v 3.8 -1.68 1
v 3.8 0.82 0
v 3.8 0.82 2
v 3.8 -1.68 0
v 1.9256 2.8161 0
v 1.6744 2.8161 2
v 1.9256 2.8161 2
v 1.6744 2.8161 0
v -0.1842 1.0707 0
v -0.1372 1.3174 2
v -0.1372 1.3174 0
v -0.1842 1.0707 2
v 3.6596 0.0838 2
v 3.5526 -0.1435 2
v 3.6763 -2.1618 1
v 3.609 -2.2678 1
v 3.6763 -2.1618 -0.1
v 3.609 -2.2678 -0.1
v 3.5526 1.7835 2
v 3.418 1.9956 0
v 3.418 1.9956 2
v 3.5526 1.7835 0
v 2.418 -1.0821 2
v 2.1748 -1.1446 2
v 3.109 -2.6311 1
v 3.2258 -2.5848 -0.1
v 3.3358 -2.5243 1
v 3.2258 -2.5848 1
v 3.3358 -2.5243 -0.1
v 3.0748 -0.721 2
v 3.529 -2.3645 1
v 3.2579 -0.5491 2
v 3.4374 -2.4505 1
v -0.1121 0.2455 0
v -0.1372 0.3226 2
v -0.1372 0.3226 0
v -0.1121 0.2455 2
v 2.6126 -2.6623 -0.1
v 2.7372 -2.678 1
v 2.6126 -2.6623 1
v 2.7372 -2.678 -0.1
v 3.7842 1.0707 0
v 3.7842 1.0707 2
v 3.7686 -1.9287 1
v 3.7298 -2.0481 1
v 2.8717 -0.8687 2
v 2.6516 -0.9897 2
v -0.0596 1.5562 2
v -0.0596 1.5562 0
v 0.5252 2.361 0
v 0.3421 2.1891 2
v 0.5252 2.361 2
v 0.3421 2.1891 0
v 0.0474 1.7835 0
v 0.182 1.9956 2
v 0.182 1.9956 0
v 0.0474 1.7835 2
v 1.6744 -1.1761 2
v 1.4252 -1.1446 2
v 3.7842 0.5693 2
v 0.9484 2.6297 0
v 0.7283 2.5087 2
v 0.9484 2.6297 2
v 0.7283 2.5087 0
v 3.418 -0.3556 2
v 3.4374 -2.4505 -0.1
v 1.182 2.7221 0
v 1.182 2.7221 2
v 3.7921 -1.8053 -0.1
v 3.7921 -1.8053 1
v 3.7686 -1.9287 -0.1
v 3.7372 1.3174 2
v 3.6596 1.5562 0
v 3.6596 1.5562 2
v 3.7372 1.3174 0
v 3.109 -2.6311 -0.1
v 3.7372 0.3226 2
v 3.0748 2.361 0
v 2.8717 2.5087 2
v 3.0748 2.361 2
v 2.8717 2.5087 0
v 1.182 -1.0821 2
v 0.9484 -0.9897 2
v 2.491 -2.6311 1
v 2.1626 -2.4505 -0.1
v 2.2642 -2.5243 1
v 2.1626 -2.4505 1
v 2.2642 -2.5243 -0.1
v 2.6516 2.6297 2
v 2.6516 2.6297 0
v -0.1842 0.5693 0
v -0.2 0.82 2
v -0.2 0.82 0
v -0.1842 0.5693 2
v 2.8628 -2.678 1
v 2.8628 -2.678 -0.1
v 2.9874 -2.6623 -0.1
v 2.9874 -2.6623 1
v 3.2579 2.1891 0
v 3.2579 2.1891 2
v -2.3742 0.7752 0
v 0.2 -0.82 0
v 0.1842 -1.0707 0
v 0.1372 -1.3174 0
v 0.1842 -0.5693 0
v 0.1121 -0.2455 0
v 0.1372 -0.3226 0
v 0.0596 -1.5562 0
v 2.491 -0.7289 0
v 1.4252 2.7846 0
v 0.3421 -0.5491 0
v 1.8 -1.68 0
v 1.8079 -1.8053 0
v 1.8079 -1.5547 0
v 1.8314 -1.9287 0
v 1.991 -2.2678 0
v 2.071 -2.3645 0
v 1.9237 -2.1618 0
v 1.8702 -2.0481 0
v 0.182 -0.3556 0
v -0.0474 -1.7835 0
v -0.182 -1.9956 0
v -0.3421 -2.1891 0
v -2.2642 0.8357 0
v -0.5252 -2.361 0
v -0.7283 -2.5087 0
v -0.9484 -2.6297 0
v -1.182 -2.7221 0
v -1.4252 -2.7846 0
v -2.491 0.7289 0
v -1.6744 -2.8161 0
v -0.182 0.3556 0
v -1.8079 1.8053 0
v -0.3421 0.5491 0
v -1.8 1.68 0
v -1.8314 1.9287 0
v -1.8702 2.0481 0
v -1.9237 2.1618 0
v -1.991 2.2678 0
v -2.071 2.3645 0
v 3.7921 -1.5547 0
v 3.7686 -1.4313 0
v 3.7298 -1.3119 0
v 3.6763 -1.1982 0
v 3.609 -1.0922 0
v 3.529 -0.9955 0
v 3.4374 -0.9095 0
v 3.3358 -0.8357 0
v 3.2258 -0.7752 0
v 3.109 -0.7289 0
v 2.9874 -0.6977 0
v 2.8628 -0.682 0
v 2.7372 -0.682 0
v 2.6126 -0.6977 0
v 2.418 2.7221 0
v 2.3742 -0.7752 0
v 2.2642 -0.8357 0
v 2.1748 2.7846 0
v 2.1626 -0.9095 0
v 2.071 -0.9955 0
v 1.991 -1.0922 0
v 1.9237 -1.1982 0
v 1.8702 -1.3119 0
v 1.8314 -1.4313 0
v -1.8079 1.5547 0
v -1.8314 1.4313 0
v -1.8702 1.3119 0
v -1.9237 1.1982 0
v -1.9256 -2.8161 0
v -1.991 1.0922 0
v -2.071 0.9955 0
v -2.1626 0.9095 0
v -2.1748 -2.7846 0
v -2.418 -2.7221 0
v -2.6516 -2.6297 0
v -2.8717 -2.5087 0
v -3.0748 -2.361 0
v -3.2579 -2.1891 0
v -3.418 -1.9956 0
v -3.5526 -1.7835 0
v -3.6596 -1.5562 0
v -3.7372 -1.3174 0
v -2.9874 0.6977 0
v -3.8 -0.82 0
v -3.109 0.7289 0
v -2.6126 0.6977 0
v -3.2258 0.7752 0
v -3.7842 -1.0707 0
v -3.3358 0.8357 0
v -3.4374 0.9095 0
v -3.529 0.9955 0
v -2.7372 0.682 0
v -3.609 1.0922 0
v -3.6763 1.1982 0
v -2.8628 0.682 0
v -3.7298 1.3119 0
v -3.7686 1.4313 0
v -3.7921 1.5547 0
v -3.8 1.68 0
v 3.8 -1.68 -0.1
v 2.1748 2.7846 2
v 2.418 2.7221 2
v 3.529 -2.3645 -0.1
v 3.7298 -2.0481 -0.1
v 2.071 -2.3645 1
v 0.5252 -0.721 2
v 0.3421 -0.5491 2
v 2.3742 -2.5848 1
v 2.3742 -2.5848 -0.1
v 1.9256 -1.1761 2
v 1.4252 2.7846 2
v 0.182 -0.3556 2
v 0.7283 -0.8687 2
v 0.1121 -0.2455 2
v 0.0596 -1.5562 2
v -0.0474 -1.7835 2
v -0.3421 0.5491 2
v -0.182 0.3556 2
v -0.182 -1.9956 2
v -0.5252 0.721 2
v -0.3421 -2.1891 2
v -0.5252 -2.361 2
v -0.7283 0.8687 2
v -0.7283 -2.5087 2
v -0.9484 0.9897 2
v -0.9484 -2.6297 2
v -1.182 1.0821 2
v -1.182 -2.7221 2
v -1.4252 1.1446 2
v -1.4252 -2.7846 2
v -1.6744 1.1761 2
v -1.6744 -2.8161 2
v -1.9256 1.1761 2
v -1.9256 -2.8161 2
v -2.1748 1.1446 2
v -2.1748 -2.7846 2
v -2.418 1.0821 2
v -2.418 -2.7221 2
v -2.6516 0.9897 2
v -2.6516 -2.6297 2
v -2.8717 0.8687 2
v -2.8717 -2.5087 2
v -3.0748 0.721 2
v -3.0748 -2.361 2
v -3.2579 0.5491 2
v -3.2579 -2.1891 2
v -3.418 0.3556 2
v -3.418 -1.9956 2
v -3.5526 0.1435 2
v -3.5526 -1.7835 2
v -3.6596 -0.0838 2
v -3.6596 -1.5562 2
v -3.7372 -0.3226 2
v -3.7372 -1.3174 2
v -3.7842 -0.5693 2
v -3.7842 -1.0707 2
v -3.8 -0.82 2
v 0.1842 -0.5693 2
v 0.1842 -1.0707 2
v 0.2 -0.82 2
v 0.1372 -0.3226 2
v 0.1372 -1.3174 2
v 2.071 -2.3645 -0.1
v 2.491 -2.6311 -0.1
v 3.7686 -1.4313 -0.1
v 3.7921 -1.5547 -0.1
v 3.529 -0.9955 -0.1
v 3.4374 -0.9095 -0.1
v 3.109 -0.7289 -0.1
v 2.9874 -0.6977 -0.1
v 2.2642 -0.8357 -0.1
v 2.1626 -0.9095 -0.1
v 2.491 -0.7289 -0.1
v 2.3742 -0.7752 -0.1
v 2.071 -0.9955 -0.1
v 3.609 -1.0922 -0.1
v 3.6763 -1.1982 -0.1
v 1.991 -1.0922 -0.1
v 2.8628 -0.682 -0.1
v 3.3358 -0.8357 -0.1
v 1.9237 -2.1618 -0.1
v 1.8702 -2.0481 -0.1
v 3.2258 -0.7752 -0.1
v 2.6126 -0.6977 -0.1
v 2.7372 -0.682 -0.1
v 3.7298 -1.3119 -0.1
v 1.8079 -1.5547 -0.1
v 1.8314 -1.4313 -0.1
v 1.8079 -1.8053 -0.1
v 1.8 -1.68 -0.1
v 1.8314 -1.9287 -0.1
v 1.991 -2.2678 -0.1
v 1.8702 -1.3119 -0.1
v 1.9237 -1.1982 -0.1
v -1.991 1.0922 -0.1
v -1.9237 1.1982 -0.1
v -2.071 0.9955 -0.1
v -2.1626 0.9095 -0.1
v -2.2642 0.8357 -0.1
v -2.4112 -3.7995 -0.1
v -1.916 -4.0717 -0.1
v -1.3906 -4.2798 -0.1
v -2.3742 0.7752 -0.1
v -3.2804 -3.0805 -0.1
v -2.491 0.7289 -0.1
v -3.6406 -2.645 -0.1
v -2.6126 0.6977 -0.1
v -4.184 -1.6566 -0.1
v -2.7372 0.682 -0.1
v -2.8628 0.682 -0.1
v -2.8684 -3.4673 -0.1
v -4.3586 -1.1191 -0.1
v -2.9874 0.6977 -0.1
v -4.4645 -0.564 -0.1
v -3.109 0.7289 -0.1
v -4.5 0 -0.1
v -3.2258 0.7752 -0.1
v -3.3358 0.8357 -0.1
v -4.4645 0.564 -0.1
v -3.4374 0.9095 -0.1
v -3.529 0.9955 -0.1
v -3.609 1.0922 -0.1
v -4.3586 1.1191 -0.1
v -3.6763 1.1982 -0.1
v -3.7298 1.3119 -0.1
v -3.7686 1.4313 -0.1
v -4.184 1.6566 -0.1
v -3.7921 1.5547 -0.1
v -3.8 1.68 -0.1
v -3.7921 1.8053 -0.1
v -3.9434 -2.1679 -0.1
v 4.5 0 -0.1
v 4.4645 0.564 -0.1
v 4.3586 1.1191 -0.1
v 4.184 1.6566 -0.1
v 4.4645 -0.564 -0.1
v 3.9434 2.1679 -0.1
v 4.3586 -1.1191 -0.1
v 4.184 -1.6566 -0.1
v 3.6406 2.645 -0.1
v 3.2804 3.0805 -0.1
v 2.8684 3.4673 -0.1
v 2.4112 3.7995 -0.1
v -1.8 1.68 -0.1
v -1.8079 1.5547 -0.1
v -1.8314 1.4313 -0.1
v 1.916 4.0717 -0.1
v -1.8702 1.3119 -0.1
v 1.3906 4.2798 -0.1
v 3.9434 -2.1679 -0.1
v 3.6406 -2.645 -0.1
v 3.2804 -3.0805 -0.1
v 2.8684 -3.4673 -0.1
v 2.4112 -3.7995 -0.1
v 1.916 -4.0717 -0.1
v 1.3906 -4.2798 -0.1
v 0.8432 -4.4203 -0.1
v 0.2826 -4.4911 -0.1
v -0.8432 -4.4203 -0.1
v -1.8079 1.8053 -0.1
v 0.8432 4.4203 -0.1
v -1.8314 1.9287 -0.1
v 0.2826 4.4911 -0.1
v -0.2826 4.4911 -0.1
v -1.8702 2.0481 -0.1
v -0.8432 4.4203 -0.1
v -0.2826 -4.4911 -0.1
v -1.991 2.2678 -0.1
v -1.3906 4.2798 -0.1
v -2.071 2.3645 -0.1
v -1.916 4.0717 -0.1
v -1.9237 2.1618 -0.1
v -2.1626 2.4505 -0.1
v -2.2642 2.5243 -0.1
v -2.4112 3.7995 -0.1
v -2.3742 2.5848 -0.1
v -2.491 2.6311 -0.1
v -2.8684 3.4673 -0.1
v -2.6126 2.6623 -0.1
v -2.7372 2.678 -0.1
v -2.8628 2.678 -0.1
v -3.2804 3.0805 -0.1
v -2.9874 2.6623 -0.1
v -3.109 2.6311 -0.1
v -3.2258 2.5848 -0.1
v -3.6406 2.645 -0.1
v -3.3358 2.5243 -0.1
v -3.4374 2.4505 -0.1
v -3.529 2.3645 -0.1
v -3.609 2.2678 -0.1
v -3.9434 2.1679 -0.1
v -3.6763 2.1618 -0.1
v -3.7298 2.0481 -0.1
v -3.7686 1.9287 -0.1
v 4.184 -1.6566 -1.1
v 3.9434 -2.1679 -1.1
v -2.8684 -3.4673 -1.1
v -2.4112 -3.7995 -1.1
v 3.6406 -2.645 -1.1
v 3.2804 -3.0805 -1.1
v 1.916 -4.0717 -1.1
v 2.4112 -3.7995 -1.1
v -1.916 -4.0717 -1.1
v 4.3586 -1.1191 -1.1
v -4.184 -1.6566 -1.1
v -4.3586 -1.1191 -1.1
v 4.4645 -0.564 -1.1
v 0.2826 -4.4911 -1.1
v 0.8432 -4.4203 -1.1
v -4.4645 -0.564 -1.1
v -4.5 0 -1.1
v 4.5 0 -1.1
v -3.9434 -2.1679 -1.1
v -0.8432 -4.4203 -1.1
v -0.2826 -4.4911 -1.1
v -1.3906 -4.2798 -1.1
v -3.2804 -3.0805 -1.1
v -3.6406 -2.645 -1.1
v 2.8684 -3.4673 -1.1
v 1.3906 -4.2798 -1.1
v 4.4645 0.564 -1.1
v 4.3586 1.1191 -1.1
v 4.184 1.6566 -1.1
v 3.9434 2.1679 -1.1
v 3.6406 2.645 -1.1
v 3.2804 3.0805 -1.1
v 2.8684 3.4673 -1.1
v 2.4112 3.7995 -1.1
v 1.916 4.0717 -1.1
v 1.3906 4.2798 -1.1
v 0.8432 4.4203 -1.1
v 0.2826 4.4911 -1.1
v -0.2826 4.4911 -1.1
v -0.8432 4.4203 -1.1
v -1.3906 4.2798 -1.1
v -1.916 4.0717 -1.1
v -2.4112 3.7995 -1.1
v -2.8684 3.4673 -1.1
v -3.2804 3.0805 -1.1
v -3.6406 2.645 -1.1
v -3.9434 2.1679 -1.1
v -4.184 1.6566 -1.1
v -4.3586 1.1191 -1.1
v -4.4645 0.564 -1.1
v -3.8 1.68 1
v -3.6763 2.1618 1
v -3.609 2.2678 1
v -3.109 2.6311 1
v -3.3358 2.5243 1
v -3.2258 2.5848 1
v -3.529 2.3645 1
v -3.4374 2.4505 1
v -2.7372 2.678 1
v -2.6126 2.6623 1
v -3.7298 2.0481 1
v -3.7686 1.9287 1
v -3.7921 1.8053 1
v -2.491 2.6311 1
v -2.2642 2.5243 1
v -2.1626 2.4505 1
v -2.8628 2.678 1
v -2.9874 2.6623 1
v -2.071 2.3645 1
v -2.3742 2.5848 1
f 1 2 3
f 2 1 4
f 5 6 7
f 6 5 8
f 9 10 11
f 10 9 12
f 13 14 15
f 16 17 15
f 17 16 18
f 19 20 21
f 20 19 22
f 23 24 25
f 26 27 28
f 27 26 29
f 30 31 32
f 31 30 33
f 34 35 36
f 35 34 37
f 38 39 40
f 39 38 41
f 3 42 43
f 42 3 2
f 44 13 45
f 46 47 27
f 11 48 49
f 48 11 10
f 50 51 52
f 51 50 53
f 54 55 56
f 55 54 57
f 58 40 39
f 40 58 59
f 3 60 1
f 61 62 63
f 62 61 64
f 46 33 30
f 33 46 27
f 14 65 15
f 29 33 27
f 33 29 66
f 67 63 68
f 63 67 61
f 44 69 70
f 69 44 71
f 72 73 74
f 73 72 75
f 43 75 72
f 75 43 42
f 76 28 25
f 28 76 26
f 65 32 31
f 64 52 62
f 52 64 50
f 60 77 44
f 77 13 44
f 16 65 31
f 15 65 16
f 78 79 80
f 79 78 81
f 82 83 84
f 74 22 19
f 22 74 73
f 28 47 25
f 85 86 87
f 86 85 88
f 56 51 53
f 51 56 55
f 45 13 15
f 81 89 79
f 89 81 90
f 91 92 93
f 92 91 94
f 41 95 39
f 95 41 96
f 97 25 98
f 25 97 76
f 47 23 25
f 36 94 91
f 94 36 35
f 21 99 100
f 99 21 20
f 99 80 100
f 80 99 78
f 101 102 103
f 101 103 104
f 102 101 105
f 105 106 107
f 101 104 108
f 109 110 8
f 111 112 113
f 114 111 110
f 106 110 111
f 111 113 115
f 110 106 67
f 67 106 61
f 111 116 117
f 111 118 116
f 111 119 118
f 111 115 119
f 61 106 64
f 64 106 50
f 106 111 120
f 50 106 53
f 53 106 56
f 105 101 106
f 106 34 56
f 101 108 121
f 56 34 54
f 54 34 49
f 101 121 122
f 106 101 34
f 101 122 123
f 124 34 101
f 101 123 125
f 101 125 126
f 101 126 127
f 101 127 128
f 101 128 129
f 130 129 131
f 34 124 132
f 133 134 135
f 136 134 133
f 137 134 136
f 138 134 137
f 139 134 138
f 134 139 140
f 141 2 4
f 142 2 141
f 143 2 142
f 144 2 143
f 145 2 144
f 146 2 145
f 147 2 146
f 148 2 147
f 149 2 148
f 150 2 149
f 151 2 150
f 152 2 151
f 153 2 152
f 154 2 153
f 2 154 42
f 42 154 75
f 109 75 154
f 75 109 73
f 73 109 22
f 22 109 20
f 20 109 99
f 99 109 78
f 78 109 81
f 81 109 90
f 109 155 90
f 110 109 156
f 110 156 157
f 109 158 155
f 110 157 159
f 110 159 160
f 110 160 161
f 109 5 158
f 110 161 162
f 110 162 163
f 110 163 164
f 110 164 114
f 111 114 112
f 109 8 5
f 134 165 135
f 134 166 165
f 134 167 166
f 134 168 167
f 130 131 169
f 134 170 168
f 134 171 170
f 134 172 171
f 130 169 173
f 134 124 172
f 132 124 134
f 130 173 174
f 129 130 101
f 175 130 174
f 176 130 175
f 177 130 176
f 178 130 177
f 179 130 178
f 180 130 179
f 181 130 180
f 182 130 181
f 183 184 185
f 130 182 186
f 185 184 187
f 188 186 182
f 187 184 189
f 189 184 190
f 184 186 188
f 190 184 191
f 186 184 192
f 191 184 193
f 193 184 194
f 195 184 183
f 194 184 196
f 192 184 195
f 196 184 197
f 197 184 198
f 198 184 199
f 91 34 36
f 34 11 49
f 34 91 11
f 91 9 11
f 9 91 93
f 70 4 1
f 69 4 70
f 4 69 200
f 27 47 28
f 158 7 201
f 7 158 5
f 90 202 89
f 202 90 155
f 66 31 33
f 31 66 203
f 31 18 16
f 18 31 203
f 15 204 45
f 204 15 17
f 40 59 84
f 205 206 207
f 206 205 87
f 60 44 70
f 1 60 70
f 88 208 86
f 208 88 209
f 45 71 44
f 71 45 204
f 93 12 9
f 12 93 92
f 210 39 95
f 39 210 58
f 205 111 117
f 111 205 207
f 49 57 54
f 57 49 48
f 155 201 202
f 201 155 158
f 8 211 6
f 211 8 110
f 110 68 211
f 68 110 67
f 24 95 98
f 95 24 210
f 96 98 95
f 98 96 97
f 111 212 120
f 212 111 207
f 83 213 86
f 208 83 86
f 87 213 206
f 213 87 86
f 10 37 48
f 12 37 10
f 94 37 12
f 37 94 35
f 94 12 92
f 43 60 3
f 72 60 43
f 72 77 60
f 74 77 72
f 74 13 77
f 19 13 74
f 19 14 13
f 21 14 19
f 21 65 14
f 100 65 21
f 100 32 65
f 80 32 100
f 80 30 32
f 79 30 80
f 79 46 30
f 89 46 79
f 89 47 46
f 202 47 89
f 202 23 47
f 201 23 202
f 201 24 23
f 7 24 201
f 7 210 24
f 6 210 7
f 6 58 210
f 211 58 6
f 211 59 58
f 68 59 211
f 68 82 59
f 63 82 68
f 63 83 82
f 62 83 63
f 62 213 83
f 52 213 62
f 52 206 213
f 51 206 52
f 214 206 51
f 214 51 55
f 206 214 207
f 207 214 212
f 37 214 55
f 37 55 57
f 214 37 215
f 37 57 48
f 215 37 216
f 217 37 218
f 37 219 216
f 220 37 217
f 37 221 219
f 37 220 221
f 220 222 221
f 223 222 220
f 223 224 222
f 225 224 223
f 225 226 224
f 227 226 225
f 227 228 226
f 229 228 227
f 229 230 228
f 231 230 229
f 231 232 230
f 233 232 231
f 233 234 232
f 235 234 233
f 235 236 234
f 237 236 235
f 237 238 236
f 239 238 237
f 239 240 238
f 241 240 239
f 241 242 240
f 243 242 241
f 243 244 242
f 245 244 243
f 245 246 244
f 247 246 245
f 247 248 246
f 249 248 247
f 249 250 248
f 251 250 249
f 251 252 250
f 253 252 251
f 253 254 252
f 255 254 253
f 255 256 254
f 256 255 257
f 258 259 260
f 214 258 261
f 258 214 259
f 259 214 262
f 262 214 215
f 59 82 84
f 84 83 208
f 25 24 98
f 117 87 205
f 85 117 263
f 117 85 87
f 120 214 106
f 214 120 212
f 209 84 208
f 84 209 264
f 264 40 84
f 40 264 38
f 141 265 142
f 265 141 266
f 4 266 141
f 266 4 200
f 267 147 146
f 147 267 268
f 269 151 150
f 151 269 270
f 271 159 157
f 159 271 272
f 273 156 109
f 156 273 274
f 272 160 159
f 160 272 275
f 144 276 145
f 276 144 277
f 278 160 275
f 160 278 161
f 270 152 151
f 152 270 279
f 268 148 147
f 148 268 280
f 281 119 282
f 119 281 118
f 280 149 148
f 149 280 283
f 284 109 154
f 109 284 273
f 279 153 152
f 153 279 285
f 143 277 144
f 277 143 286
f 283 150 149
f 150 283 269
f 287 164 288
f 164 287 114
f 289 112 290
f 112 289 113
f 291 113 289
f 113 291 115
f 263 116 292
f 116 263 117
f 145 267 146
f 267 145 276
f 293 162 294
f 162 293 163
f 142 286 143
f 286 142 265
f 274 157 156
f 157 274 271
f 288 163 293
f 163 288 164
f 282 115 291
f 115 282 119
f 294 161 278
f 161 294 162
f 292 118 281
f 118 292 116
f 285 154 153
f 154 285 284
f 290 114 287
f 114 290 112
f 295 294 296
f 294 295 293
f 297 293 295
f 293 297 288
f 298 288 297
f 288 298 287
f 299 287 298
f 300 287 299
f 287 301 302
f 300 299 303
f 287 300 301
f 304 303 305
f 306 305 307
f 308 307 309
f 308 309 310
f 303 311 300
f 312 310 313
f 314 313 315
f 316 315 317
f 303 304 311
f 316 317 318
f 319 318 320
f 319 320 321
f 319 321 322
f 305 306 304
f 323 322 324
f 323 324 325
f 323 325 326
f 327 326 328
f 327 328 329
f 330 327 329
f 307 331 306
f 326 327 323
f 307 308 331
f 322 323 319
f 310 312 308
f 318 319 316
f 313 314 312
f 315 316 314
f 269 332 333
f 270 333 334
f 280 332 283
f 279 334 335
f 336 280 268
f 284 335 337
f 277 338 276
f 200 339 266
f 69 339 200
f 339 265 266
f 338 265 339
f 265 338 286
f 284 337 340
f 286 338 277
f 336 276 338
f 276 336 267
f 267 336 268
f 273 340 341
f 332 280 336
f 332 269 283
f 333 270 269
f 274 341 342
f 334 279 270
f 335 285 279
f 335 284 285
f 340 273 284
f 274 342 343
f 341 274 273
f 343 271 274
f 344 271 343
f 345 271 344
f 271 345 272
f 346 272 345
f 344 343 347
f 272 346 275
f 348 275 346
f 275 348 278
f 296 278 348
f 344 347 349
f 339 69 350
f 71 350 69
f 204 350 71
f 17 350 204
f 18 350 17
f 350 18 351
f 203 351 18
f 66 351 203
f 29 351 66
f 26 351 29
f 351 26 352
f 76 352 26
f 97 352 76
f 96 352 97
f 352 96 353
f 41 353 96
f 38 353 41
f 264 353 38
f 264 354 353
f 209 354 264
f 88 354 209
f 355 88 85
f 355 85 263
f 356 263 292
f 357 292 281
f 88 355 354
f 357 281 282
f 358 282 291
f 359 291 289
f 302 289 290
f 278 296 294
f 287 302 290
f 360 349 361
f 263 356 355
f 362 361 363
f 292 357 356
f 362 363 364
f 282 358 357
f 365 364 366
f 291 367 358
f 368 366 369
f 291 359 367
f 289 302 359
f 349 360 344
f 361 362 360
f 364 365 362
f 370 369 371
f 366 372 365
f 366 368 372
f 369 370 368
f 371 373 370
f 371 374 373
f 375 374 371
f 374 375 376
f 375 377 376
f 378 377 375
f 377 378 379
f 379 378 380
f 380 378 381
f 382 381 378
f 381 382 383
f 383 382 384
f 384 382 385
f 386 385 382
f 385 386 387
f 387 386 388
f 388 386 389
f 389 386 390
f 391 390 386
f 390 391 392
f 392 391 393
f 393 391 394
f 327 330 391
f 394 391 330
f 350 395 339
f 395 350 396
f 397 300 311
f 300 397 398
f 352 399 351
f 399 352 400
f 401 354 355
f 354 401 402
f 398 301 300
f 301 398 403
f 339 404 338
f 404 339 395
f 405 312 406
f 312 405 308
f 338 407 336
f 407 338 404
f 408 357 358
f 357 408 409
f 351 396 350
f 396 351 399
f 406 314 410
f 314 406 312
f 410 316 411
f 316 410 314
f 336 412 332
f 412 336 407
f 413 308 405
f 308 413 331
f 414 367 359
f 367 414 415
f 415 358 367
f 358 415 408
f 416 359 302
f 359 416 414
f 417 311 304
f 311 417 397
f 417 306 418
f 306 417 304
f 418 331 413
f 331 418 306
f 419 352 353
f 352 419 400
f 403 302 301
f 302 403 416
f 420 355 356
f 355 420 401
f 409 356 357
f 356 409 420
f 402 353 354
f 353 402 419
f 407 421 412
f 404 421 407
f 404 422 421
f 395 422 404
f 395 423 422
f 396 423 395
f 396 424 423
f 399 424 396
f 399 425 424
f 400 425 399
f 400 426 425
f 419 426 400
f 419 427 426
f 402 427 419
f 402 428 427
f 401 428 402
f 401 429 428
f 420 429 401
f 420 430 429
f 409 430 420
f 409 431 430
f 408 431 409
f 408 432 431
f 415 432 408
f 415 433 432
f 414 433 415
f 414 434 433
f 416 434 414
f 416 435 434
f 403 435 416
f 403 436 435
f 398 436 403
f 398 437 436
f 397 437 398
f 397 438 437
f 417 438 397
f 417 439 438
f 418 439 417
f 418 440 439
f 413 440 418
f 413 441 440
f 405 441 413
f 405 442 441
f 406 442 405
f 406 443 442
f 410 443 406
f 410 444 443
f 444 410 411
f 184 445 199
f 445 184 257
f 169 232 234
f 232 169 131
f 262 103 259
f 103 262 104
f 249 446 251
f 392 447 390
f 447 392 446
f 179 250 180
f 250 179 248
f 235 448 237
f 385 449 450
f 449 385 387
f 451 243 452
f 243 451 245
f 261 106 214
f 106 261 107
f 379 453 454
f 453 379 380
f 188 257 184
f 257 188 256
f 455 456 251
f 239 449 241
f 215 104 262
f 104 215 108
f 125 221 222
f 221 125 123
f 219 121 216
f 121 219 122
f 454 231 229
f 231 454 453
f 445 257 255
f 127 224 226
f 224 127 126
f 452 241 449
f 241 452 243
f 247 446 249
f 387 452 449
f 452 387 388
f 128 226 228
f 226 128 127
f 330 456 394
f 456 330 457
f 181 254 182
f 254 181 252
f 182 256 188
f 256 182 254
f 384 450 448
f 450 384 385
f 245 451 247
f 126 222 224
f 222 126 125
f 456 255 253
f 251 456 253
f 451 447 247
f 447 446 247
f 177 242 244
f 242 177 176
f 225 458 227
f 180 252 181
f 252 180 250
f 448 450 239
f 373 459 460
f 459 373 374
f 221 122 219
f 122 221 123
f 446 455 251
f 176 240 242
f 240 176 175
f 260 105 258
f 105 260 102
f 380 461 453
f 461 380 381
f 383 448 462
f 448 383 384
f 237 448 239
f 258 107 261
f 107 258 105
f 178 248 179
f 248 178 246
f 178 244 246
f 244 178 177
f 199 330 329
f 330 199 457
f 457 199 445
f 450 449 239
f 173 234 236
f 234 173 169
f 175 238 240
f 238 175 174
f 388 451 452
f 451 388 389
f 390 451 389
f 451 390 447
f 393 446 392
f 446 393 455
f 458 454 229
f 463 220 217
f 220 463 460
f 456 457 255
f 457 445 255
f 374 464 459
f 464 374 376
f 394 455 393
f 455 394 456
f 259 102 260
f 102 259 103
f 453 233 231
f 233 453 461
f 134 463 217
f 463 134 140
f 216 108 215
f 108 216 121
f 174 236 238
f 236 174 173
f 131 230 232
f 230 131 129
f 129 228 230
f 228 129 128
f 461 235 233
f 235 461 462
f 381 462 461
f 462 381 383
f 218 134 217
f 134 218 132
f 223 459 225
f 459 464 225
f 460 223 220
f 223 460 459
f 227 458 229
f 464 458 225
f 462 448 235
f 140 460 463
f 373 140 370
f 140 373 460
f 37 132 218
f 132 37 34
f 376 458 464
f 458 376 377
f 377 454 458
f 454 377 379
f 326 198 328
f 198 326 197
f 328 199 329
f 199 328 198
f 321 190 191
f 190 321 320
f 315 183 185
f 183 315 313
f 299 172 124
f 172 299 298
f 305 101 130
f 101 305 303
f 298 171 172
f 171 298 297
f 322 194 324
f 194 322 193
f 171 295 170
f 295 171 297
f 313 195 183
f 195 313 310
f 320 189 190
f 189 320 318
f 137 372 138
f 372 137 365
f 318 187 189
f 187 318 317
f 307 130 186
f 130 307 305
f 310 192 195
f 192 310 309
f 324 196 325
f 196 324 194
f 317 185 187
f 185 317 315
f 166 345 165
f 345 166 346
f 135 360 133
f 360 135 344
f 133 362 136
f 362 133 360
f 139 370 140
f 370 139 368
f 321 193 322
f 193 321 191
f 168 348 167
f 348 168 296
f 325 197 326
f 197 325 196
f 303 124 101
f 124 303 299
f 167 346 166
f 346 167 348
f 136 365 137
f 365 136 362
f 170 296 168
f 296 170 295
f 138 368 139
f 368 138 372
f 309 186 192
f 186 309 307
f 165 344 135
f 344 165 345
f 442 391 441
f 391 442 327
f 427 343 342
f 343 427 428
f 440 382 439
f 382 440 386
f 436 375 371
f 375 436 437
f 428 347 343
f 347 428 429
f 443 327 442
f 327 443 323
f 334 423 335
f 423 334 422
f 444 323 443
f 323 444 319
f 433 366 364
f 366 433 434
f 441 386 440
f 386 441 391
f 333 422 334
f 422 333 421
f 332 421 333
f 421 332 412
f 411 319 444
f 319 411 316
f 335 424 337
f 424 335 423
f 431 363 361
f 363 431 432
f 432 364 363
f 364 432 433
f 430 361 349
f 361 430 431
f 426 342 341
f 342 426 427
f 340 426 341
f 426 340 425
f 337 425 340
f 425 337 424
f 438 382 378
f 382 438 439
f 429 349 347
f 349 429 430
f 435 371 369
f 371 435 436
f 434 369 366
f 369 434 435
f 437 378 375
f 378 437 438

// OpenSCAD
/*
  author: Christopher O'Brien <obriencj@gmail.com>
  license: GPL v3
*/


module clasp_half($fn=50) {

     // this is the primary positioning translation, tweak this for
     // better clasping action.
     tweak_x = 1.80;
     tweak_y = 0.82;

     union() {
	  translate([tweak_x, tweak_y, 0]) {
	       hull() {
		    // the catch itself
		    cylinder(2, 2, 2);

		    // the connecting slant from the catch to the
		    // anchor
		    translate([1, -2.5, 0]) {
			 cylinder(1, 1, 1);
		    };
	       };
	       // cylinder anchor into back plate
	       translate([1, -2.5, -1]) {
		    cylinder(1, 1, 1);
	       };
	  };

	  // backing plate half-circle
	  translate([0, 0, -1.1]) {
	       intersection() {
		    translate([0, -4, 0])
			 cube([10, 8, 2], center=true);
		    cylinder(2, 4.5, 4.5);
	       };
	  };
     };

}


// For debugging, render a pair of clasp halves, with the second
// highlighted


module dupl_flip() {
     children();
     #rotate([0, 0, 180]) children();
}


dupl_flip() {
     clasp_half();
};


// The end.
